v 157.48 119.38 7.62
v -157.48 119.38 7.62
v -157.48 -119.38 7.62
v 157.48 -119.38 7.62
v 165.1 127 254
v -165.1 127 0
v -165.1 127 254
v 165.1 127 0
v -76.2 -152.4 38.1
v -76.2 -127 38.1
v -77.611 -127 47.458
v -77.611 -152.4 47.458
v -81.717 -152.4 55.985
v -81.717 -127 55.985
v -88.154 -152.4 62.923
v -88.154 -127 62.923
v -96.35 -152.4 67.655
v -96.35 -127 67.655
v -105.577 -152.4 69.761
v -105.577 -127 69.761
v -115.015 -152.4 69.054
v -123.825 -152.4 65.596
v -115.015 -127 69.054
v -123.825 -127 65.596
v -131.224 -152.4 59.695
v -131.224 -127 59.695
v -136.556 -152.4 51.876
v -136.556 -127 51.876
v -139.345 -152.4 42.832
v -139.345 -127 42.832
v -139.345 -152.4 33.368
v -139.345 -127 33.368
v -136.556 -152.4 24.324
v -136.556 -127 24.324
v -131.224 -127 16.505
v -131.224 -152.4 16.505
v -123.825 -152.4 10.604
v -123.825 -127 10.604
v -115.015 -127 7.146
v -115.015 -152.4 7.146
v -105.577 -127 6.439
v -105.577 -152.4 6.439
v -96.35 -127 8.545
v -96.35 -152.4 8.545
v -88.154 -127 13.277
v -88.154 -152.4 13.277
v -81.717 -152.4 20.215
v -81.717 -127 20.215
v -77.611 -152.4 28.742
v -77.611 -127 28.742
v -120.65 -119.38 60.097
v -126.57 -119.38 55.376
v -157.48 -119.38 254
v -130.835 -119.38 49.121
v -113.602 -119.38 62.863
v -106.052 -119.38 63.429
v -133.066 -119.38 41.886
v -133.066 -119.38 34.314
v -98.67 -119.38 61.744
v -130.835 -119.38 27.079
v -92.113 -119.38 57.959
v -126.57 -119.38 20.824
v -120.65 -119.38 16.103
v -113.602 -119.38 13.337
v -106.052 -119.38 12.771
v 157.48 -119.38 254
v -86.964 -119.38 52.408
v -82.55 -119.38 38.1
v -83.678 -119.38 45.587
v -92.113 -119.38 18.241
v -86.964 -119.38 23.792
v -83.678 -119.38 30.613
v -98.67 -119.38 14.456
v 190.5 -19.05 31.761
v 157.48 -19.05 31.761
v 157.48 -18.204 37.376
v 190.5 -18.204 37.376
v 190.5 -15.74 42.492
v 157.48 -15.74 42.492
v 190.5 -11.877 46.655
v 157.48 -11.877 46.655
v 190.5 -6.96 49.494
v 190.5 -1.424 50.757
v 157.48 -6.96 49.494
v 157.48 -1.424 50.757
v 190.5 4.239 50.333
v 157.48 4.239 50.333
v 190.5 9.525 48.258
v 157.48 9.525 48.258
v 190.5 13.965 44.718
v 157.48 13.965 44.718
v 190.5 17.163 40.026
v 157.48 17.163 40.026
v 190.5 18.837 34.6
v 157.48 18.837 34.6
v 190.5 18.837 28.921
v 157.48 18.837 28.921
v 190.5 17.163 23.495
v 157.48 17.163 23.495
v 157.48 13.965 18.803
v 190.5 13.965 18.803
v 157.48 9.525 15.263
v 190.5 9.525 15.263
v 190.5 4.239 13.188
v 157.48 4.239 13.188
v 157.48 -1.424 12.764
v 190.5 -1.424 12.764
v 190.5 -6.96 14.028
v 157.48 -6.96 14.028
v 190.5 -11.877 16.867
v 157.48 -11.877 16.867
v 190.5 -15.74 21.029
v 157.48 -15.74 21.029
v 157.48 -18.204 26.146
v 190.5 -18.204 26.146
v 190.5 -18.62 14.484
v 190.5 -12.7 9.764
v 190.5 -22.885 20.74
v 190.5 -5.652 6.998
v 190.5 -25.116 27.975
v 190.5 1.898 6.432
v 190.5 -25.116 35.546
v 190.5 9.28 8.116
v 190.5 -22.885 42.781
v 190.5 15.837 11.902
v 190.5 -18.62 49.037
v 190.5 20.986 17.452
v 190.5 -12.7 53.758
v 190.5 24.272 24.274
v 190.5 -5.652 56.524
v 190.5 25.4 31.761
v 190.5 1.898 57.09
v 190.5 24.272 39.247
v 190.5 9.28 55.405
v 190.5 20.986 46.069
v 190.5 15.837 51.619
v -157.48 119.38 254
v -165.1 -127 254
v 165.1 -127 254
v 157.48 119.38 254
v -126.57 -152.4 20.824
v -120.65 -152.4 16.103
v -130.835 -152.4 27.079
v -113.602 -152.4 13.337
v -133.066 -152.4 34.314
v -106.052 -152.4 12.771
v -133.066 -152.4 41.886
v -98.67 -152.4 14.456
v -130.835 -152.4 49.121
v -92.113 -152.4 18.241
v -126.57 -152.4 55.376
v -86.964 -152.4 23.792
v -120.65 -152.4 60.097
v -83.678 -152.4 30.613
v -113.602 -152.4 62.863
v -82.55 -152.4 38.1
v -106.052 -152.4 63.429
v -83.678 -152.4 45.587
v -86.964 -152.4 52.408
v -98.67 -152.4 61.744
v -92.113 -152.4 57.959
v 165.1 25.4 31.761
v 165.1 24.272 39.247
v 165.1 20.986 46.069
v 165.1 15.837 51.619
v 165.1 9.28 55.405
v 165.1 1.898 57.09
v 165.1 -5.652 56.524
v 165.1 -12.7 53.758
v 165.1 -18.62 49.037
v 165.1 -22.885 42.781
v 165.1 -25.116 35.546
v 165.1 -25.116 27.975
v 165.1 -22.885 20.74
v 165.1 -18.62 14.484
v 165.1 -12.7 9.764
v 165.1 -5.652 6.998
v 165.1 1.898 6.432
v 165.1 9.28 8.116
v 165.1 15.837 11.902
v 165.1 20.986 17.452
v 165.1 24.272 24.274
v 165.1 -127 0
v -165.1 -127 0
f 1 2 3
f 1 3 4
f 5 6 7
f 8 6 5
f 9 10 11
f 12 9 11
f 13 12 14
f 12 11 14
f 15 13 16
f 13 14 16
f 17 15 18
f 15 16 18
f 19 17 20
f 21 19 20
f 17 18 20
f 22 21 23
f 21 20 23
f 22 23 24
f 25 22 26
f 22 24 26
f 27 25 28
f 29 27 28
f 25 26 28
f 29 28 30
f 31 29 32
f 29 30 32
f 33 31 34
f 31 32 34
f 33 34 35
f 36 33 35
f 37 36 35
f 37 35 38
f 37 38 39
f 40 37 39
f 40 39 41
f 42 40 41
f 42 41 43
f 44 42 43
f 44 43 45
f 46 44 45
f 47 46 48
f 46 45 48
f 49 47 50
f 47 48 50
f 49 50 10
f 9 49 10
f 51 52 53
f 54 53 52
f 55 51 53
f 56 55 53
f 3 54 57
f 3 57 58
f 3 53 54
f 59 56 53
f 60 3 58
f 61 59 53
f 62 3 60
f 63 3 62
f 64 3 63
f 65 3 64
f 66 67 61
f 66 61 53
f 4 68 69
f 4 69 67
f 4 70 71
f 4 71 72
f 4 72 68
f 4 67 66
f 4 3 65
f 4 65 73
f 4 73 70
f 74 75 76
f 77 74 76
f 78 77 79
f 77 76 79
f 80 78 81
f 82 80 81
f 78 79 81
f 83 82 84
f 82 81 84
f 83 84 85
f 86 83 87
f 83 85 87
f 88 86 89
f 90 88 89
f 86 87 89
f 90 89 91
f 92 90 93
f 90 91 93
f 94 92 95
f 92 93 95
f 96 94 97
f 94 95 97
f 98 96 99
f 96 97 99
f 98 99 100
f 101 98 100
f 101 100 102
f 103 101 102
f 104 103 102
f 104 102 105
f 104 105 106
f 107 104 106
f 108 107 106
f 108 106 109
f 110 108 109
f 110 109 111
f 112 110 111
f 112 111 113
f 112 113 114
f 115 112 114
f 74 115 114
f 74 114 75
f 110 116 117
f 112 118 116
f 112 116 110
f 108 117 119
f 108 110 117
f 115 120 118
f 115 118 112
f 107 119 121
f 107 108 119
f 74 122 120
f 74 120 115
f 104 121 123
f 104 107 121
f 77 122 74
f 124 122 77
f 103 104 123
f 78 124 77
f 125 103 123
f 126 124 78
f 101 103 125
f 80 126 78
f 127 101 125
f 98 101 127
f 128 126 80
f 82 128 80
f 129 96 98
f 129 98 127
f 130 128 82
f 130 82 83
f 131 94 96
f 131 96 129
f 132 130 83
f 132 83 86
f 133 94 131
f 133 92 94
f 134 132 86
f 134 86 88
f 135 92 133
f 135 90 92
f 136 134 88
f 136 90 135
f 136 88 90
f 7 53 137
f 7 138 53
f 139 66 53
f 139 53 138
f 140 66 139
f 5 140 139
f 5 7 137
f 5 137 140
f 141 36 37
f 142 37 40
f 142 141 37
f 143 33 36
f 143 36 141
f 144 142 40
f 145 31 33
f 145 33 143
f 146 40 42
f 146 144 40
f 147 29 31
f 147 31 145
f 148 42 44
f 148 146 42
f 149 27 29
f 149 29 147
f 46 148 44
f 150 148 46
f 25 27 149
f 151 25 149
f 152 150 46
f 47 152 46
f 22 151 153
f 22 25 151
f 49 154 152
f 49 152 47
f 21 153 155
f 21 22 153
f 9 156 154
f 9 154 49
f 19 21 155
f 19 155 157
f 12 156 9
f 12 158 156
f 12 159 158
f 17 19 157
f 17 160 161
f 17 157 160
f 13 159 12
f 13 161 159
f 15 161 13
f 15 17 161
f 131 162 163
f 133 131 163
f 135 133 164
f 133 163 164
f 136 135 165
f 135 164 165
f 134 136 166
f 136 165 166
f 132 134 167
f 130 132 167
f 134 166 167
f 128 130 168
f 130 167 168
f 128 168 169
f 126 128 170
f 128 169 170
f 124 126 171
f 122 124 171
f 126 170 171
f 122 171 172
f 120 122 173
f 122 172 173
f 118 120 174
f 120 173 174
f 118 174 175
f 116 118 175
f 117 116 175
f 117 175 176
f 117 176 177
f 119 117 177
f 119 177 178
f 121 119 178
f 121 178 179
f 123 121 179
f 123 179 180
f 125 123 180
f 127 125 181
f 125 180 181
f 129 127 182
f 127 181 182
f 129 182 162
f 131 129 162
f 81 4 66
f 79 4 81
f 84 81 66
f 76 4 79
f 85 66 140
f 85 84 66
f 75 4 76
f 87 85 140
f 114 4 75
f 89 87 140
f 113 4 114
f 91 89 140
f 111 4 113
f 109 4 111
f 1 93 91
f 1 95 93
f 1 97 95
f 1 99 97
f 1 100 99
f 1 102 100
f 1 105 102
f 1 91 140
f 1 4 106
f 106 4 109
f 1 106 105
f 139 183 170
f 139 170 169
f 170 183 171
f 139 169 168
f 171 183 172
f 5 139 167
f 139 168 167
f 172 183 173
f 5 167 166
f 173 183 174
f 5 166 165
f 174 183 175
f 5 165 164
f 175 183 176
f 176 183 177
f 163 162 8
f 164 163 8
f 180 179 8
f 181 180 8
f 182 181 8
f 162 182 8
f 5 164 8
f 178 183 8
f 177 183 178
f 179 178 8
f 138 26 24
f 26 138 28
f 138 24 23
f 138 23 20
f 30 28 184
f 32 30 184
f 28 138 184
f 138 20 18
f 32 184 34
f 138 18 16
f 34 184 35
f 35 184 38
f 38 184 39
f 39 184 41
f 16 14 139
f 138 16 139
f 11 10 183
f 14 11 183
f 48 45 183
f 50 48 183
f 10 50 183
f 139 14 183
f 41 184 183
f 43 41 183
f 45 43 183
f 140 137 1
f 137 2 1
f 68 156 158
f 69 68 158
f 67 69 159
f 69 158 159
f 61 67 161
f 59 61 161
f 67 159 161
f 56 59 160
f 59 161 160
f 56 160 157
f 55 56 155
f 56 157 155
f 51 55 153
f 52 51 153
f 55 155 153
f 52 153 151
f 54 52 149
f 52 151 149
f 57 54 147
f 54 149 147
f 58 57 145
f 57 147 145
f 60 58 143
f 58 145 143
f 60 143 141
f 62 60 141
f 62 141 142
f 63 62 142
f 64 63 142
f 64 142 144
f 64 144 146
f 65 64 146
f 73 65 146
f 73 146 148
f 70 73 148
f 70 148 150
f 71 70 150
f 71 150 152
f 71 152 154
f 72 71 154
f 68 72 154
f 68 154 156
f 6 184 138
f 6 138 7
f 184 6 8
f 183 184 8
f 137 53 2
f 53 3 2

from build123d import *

# Parameters (mm, degrees)
F0_W      = 330.2
F0_H      = 254
F1_DEPTH  = 254
F2_T      = -7.62
F3_R      = 25.4
F4_DEPTH  = 25.4
F6_D      = 38.1
F6_DEPTH  = 76.2
F7_R      = 31.75
F8_DEPTH  = 25.4
F9_R      = 25.4
F10_DEPTH = 76.2


with BuildPart() as f1:
    # F0 (on Top) → F1 (new body)
    with BuildSketch(Plane.XY):
        Rectangle(F0_W, F0_H)
    extrude(amount=F1_DEPTH)

    # F2
    f2_openings = [f1.faces().sort_by_distance(p)[0] for p in [
        (0, 0, 254),
    ]]
    offset(amount=F2_T, openings=f2_openings)

    # F3 (on face) → F4 (join)
    with BuildSketch(Plane.YZ.offset(165.1)):
        with Locations((0, 31.760685)):
            Circle(F3_R)
    extrude(amount=F4_DEPTH)

    # F6
    with Locations(Plane.YZ.offset(190.5)):
        with Locations((0, 31.760685)):
            Hole(F6_D / 2, depth=F6_DEPTH)

    # F7 (on face) → F8 (join)
    with BuildSketch(Plane.XZ.offset(127)):
        with Locations((-107.95, 38.1)):
            Circle(F7_R)
    extrude(amount=F8_DEPTH)

    # F9 (on face) → F10 (cut)
    with BuildSketch(Plane.XZ.offset(152.4)):
        with Locations((-107.95, 38.1)):
            Circle(F9_R)
    extrude(amount=-F10_DEPTH, mode=Mode.SUBTRACT)


solid = f1.part
